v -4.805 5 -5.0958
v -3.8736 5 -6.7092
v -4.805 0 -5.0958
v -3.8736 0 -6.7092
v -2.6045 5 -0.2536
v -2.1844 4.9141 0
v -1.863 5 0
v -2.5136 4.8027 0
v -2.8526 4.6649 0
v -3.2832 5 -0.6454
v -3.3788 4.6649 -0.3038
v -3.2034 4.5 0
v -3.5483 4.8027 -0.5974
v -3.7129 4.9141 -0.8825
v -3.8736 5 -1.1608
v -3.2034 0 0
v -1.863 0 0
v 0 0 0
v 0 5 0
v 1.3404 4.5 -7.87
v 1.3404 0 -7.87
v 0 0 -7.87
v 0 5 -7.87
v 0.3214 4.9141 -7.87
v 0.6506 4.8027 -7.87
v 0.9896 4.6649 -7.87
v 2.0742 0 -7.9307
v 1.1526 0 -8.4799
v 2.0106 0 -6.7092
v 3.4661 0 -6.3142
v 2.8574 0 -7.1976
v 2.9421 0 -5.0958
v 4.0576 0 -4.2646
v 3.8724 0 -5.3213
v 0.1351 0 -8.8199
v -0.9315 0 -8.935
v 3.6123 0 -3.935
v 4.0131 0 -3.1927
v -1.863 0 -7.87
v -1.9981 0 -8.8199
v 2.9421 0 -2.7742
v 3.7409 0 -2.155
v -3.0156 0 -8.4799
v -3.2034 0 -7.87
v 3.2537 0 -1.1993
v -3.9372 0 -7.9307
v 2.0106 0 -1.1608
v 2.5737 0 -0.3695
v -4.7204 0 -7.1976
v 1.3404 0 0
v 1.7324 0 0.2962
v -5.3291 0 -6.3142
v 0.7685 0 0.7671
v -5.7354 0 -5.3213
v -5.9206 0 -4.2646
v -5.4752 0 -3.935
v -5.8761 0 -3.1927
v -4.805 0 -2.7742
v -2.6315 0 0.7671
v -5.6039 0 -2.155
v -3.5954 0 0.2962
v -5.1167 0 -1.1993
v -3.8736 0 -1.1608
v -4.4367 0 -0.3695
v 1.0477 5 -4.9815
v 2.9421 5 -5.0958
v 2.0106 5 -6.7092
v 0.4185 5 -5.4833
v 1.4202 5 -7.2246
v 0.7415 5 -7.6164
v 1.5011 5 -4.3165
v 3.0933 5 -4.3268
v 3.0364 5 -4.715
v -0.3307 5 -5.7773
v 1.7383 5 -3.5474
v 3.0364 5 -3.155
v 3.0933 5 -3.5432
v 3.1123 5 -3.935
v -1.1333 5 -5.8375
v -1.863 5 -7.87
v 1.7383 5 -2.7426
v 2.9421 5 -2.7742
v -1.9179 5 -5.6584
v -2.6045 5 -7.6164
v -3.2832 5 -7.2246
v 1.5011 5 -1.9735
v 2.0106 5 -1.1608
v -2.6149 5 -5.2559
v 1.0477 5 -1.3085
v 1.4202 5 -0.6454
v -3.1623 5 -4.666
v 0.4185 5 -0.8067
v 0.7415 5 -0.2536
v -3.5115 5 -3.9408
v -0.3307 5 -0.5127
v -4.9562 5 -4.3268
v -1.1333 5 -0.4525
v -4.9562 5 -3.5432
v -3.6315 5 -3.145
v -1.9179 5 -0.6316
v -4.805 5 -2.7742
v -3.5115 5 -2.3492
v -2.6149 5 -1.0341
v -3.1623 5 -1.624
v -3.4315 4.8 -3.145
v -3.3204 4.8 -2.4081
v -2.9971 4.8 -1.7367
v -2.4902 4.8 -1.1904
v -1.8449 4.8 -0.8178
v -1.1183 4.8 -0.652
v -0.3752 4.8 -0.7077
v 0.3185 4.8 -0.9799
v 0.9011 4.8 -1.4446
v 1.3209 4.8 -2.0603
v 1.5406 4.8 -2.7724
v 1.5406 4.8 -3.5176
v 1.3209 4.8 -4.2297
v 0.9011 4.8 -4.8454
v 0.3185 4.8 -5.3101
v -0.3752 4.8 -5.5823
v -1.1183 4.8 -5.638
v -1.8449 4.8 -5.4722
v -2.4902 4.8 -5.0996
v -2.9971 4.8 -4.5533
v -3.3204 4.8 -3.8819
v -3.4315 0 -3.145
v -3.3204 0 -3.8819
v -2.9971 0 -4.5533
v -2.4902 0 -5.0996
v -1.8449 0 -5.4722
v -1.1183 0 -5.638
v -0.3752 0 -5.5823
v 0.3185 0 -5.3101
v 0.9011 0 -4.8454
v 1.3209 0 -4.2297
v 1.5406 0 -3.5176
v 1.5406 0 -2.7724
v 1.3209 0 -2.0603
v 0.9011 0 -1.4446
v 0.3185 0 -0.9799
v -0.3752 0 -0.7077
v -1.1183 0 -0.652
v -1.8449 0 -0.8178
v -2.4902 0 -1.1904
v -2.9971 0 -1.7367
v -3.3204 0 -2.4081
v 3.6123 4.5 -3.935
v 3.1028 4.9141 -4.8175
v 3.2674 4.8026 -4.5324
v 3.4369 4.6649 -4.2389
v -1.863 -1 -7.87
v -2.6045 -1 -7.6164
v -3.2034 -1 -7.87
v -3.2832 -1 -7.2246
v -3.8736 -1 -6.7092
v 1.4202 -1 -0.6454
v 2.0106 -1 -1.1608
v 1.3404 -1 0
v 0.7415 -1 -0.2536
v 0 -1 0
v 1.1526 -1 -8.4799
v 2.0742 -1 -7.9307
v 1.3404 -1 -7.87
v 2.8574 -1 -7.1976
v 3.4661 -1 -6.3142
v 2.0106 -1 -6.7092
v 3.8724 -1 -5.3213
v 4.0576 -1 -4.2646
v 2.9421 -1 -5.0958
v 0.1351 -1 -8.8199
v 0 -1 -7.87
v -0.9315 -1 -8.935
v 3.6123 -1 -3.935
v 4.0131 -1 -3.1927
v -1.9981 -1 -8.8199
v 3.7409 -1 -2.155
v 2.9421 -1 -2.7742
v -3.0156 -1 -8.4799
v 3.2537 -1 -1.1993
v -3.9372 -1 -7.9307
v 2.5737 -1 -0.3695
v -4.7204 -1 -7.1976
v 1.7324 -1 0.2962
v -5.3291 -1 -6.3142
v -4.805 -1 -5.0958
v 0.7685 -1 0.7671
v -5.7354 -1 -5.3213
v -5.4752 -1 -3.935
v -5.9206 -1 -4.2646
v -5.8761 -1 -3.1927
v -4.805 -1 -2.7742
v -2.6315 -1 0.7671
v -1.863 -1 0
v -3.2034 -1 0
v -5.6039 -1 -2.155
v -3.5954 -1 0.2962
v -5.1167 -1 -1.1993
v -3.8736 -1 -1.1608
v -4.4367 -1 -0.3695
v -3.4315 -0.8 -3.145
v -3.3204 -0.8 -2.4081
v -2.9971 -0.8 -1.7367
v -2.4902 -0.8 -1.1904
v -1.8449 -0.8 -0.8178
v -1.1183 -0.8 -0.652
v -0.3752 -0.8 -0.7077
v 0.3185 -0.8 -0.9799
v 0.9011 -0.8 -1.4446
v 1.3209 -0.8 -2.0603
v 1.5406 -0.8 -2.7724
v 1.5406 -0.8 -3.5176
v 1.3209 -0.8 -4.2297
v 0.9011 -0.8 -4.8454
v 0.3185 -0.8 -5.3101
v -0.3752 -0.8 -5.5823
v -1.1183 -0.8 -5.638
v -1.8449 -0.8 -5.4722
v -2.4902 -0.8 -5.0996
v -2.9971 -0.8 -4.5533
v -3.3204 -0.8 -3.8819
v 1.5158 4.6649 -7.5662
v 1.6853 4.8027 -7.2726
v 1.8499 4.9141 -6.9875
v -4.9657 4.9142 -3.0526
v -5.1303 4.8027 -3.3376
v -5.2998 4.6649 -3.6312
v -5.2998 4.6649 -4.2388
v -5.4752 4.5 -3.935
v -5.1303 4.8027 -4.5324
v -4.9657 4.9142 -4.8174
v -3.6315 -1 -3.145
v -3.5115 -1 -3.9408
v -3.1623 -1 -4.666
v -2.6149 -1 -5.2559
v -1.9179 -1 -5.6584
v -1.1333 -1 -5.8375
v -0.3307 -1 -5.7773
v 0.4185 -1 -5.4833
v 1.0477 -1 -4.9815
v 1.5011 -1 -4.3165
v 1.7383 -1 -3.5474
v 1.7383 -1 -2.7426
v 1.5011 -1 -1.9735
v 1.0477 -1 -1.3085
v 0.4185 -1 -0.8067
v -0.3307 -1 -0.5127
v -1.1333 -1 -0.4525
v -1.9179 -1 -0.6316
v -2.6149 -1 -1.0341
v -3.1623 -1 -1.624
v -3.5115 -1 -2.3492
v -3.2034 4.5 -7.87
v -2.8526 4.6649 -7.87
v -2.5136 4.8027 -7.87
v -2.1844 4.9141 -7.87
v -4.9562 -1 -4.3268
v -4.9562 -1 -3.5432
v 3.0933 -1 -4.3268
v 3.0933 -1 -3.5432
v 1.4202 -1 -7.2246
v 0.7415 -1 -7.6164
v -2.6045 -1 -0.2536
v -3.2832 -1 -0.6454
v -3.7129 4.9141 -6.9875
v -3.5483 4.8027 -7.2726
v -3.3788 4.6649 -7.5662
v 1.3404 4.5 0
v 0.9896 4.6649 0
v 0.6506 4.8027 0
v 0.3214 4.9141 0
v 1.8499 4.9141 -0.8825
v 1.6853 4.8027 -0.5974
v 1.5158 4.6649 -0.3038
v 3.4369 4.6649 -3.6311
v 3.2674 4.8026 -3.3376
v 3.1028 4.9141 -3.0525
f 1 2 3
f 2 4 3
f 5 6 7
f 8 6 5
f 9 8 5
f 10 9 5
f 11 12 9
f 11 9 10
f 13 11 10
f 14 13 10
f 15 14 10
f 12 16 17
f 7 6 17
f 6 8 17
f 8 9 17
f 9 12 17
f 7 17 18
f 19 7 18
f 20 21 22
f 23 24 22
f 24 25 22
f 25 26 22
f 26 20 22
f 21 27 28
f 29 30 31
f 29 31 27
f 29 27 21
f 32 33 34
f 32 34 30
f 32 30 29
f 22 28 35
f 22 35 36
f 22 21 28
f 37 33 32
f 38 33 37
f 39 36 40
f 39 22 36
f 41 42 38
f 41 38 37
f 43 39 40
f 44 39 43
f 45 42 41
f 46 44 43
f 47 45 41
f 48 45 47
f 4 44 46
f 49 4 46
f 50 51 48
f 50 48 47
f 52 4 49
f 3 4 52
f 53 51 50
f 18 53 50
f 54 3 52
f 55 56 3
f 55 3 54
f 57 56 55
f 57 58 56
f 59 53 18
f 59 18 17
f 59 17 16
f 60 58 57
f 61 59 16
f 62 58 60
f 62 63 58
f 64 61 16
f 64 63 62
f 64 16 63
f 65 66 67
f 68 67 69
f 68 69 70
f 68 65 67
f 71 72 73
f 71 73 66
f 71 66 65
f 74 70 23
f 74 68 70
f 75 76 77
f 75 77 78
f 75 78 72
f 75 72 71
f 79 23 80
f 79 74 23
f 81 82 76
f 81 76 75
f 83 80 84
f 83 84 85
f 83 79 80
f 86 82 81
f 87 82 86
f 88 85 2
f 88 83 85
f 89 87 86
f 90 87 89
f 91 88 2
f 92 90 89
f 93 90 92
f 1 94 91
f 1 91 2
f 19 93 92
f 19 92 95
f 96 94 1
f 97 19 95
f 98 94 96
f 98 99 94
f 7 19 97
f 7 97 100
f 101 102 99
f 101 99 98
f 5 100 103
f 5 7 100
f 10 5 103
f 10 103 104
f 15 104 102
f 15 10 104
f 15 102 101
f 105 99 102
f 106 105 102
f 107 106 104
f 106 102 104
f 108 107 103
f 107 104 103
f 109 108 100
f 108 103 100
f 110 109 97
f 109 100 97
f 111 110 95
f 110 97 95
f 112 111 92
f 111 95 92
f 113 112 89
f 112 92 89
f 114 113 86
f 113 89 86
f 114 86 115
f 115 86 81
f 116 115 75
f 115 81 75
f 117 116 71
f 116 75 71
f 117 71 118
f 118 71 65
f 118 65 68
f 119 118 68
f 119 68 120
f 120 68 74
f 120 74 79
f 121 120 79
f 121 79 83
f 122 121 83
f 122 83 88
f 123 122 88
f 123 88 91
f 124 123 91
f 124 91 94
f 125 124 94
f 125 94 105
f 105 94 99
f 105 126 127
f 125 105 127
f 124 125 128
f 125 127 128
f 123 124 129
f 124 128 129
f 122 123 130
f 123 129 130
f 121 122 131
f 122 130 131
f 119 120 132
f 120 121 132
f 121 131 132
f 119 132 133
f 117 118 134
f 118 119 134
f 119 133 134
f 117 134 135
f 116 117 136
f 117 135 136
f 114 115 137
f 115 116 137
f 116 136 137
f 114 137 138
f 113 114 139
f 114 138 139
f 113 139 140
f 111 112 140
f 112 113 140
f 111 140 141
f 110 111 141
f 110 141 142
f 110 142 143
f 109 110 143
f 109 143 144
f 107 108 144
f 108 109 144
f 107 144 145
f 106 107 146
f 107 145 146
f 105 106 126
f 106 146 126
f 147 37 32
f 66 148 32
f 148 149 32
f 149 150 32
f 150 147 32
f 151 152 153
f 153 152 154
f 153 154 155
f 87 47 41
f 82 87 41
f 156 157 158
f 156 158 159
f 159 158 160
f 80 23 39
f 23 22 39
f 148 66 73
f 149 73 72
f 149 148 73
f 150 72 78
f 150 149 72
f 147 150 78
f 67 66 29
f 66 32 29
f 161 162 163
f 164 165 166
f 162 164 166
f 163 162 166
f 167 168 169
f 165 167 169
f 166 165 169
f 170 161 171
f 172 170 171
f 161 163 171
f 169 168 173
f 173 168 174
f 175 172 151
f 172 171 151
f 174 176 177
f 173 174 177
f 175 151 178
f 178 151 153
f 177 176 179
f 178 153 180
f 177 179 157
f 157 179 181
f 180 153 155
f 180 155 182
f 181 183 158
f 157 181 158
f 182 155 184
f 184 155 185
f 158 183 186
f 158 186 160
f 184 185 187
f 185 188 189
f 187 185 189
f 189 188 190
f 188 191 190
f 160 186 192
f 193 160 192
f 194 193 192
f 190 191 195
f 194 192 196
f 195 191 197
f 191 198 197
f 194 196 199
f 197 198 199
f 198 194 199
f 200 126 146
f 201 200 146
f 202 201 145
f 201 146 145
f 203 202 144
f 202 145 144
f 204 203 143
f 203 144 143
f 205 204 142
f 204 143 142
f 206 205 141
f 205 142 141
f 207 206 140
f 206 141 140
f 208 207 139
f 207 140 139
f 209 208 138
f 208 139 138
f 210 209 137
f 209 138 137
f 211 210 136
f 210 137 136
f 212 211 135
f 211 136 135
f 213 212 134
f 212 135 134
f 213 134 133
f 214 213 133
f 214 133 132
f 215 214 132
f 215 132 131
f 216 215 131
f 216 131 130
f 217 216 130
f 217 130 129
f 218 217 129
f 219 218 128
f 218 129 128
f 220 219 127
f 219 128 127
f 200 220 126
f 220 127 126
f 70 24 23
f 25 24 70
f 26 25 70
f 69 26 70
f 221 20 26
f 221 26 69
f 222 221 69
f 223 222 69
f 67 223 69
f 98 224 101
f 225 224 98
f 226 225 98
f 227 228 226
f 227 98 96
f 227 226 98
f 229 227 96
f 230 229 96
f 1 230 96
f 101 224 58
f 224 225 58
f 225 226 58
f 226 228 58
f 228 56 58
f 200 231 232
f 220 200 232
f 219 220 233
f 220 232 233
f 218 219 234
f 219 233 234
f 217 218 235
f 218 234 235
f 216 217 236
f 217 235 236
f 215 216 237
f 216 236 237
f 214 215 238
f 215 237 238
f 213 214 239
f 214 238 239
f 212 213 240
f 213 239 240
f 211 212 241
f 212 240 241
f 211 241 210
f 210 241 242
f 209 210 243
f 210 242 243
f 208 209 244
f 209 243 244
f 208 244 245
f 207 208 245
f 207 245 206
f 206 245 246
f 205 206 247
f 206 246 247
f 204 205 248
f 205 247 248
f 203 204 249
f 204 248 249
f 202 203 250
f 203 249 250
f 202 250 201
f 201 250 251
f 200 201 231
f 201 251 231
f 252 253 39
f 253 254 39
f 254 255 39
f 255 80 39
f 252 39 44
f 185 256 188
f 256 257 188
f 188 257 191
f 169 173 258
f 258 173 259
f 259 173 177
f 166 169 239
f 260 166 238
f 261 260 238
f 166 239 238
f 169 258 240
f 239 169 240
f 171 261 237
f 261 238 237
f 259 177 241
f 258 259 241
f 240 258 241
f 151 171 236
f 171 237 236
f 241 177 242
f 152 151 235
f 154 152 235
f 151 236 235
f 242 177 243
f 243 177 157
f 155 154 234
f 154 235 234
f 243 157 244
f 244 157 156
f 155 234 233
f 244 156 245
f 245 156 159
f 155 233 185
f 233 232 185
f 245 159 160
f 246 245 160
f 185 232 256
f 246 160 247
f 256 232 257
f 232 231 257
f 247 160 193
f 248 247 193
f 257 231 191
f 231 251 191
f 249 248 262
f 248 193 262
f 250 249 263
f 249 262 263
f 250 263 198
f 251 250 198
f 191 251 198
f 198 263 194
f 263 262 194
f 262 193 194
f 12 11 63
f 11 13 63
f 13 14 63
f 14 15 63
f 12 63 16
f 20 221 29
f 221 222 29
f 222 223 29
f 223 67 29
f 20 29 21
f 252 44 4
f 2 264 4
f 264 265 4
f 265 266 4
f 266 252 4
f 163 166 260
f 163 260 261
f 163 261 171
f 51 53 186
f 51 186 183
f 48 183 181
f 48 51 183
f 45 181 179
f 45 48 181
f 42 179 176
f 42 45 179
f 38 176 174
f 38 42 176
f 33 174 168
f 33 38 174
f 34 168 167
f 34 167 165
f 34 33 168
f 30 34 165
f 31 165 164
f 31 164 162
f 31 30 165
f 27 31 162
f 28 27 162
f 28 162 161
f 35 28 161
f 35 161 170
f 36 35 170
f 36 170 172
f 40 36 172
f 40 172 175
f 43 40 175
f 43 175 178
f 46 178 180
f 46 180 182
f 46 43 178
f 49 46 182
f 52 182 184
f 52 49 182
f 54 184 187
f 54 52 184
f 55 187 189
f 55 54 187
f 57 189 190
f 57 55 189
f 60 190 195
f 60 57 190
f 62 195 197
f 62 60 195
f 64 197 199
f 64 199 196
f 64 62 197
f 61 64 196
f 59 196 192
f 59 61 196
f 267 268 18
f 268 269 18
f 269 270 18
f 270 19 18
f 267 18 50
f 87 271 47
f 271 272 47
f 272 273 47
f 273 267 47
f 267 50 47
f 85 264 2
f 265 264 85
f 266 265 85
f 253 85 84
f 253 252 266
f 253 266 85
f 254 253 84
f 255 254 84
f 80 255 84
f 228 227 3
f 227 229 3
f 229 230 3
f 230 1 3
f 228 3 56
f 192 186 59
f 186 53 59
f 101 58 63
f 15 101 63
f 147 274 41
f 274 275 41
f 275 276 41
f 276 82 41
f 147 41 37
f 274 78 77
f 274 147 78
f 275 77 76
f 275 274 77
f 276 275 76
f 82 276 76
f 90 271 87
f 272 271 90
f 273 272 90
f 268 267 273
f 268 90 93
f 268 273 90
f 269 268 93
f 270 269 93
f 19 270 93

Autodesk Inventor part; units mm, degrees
ref_plane "YZ Plane" through (0, 0, 0) normal (1, 0, 0) x (0, 1, 0)
ref_plane "XZ Plane" through (0, 0, 0) normal (0, 1, 0) x (-1, 0, 0)
sketch "Sketch1" plane through (0, 0, 0) normal (0, 1, 0) x (-1, 0, 0)
  arc A0 (3.8736, -1.1608) -> (1.863, 0) centre (0.9315, -3.935) ccw
  line L0 (1.863, 0) -> (0, 0)
  arc A1 (0, 0) -> (-2.0106, -1.1608) centre (0.9315, -3.935) ccw
  line L1 (-2.0106, -1.1608) -> (-2.9421, -2.7742)
  arc A2 (-2.9421, -2.7742) -> (-2.9421, -5.0958) centre (0.9315, -3.935) ccw
  line L2 (-2.9421, -5.0958) -> (-2.0106, -6.7092)
  arc A3 (-2.0106, -6.7092) -> (0, -7.87) centre (0.9315, -3.935) ccw
  line L3 (0, -7.87) -> (1.863, -7.87)
  arc A4 (1.863, -7.87) -> (3.8736, -6.7092) centre (0.9315, -3.935) ccw
  line L4 (3.8736, -6.7092) -> (4.805, -5.0958)
  arc A5 (4.805, -5.0958) -> (4.805, -2.7742) centre (0.9315, -3.935) ccw
  line L5 (4.805, -2.7742) -> (3.8736, -1.1608)
  circle A6 centre (0.9315, -3.145) radius 2.5
  line L6 (-0.7685, 0.7671) -> (2.6315, 0.7671)
  arc A7 (-0.7685, 0.7671) -> (2.6315, 0.7671) centre (0.9315, -3.935) ccw
  line L7 (-1.3404, 0) -> (-3.6123, -3.935)
  line L8 (3.2034, 0) -> (-1.3404, 0)
  line L9 (5.4752, -3.935) -> (3.2034, 0)
  line L10 (3.2034, -7.87) -> (5.4752, -3.935)
  line L11 (-1.3404, -7.87) -> (3.2034, -7.87)
  line L12 (-3.6123, -3.935) -> (-1.3404, -7.87)
extrude "Extrusion1" add sketch "Sketch1" against normal blind 1 contours L5 A5 L4 A4 L3 A3 L2 A2 L1 A1 L0 A0 | A0 L8 L9 | L9 L10 A5 | A1 L7 L8 | L10 L11 A4 | A2 L12 L7 | L11 L12 A3 | L6 A7
extrude "Extrusion2" add sketch "Sketch1" along normal blind 5 contours L5 A5 L4 A4 L3 A3 L2 A2 L1 A1 L0 A0 | A0 L8 L9 | L9 L10 A5 | A1 L7 L8 | L10 L11 A4 | A2 L12 L7 | L11 L12 A3
ref_plane "Work Plane1" through (1.3404, 0, -3.935) normal (0, 0, -1) x (-1, 0, 0)
sketch "Sketch2" plane through (1.3404, 0, -3.935) normal (0, 0, -1) x (-1, 0, 0)
  line L0 (0, 5) -> (-2.2719, 5) projected
  line L1 (-2.2719, 0) -> (-2.2719, 5) projected
  line L2 (-0.2281, 5) -> (4.7719, 5) projected
  line L3 (0, 5) -> (4.5437, 5) projected
  line L4 (2.2719, 5) -> (2.2719, -2.0706)
  line L5 (-2.2719, 5) -> (0, 5) projected
  line L6 (-1.7719, 5) -> (-2.2719, 4.5)
  line L7 (-2.2719, 5) -> (-2.2719, 4.5)
  line L8 (-2.2719, 5) -> (-1.7719, 5)
  point P0 (1.3404, 0)
  dimension "d7" = 0.5
  dimension "d8" = 0.5
revolve "Revolution1" cut sketch "Sketch2" angle 360 about axis through (-0.9315, 5, -3.935) along (0, -1, 0)
thread "Thread1" size "M5x0.8" class "6H" standard "ANSI Metric M Profile" full length
chamfer "Chamfer1" distance 0.2 angle 45 2 edges at (1.5685, 5, -3.145) (1.5685, -1, -3.145)
properties part number "Mini Eccentric Spacer 6mm" material "Steel"
